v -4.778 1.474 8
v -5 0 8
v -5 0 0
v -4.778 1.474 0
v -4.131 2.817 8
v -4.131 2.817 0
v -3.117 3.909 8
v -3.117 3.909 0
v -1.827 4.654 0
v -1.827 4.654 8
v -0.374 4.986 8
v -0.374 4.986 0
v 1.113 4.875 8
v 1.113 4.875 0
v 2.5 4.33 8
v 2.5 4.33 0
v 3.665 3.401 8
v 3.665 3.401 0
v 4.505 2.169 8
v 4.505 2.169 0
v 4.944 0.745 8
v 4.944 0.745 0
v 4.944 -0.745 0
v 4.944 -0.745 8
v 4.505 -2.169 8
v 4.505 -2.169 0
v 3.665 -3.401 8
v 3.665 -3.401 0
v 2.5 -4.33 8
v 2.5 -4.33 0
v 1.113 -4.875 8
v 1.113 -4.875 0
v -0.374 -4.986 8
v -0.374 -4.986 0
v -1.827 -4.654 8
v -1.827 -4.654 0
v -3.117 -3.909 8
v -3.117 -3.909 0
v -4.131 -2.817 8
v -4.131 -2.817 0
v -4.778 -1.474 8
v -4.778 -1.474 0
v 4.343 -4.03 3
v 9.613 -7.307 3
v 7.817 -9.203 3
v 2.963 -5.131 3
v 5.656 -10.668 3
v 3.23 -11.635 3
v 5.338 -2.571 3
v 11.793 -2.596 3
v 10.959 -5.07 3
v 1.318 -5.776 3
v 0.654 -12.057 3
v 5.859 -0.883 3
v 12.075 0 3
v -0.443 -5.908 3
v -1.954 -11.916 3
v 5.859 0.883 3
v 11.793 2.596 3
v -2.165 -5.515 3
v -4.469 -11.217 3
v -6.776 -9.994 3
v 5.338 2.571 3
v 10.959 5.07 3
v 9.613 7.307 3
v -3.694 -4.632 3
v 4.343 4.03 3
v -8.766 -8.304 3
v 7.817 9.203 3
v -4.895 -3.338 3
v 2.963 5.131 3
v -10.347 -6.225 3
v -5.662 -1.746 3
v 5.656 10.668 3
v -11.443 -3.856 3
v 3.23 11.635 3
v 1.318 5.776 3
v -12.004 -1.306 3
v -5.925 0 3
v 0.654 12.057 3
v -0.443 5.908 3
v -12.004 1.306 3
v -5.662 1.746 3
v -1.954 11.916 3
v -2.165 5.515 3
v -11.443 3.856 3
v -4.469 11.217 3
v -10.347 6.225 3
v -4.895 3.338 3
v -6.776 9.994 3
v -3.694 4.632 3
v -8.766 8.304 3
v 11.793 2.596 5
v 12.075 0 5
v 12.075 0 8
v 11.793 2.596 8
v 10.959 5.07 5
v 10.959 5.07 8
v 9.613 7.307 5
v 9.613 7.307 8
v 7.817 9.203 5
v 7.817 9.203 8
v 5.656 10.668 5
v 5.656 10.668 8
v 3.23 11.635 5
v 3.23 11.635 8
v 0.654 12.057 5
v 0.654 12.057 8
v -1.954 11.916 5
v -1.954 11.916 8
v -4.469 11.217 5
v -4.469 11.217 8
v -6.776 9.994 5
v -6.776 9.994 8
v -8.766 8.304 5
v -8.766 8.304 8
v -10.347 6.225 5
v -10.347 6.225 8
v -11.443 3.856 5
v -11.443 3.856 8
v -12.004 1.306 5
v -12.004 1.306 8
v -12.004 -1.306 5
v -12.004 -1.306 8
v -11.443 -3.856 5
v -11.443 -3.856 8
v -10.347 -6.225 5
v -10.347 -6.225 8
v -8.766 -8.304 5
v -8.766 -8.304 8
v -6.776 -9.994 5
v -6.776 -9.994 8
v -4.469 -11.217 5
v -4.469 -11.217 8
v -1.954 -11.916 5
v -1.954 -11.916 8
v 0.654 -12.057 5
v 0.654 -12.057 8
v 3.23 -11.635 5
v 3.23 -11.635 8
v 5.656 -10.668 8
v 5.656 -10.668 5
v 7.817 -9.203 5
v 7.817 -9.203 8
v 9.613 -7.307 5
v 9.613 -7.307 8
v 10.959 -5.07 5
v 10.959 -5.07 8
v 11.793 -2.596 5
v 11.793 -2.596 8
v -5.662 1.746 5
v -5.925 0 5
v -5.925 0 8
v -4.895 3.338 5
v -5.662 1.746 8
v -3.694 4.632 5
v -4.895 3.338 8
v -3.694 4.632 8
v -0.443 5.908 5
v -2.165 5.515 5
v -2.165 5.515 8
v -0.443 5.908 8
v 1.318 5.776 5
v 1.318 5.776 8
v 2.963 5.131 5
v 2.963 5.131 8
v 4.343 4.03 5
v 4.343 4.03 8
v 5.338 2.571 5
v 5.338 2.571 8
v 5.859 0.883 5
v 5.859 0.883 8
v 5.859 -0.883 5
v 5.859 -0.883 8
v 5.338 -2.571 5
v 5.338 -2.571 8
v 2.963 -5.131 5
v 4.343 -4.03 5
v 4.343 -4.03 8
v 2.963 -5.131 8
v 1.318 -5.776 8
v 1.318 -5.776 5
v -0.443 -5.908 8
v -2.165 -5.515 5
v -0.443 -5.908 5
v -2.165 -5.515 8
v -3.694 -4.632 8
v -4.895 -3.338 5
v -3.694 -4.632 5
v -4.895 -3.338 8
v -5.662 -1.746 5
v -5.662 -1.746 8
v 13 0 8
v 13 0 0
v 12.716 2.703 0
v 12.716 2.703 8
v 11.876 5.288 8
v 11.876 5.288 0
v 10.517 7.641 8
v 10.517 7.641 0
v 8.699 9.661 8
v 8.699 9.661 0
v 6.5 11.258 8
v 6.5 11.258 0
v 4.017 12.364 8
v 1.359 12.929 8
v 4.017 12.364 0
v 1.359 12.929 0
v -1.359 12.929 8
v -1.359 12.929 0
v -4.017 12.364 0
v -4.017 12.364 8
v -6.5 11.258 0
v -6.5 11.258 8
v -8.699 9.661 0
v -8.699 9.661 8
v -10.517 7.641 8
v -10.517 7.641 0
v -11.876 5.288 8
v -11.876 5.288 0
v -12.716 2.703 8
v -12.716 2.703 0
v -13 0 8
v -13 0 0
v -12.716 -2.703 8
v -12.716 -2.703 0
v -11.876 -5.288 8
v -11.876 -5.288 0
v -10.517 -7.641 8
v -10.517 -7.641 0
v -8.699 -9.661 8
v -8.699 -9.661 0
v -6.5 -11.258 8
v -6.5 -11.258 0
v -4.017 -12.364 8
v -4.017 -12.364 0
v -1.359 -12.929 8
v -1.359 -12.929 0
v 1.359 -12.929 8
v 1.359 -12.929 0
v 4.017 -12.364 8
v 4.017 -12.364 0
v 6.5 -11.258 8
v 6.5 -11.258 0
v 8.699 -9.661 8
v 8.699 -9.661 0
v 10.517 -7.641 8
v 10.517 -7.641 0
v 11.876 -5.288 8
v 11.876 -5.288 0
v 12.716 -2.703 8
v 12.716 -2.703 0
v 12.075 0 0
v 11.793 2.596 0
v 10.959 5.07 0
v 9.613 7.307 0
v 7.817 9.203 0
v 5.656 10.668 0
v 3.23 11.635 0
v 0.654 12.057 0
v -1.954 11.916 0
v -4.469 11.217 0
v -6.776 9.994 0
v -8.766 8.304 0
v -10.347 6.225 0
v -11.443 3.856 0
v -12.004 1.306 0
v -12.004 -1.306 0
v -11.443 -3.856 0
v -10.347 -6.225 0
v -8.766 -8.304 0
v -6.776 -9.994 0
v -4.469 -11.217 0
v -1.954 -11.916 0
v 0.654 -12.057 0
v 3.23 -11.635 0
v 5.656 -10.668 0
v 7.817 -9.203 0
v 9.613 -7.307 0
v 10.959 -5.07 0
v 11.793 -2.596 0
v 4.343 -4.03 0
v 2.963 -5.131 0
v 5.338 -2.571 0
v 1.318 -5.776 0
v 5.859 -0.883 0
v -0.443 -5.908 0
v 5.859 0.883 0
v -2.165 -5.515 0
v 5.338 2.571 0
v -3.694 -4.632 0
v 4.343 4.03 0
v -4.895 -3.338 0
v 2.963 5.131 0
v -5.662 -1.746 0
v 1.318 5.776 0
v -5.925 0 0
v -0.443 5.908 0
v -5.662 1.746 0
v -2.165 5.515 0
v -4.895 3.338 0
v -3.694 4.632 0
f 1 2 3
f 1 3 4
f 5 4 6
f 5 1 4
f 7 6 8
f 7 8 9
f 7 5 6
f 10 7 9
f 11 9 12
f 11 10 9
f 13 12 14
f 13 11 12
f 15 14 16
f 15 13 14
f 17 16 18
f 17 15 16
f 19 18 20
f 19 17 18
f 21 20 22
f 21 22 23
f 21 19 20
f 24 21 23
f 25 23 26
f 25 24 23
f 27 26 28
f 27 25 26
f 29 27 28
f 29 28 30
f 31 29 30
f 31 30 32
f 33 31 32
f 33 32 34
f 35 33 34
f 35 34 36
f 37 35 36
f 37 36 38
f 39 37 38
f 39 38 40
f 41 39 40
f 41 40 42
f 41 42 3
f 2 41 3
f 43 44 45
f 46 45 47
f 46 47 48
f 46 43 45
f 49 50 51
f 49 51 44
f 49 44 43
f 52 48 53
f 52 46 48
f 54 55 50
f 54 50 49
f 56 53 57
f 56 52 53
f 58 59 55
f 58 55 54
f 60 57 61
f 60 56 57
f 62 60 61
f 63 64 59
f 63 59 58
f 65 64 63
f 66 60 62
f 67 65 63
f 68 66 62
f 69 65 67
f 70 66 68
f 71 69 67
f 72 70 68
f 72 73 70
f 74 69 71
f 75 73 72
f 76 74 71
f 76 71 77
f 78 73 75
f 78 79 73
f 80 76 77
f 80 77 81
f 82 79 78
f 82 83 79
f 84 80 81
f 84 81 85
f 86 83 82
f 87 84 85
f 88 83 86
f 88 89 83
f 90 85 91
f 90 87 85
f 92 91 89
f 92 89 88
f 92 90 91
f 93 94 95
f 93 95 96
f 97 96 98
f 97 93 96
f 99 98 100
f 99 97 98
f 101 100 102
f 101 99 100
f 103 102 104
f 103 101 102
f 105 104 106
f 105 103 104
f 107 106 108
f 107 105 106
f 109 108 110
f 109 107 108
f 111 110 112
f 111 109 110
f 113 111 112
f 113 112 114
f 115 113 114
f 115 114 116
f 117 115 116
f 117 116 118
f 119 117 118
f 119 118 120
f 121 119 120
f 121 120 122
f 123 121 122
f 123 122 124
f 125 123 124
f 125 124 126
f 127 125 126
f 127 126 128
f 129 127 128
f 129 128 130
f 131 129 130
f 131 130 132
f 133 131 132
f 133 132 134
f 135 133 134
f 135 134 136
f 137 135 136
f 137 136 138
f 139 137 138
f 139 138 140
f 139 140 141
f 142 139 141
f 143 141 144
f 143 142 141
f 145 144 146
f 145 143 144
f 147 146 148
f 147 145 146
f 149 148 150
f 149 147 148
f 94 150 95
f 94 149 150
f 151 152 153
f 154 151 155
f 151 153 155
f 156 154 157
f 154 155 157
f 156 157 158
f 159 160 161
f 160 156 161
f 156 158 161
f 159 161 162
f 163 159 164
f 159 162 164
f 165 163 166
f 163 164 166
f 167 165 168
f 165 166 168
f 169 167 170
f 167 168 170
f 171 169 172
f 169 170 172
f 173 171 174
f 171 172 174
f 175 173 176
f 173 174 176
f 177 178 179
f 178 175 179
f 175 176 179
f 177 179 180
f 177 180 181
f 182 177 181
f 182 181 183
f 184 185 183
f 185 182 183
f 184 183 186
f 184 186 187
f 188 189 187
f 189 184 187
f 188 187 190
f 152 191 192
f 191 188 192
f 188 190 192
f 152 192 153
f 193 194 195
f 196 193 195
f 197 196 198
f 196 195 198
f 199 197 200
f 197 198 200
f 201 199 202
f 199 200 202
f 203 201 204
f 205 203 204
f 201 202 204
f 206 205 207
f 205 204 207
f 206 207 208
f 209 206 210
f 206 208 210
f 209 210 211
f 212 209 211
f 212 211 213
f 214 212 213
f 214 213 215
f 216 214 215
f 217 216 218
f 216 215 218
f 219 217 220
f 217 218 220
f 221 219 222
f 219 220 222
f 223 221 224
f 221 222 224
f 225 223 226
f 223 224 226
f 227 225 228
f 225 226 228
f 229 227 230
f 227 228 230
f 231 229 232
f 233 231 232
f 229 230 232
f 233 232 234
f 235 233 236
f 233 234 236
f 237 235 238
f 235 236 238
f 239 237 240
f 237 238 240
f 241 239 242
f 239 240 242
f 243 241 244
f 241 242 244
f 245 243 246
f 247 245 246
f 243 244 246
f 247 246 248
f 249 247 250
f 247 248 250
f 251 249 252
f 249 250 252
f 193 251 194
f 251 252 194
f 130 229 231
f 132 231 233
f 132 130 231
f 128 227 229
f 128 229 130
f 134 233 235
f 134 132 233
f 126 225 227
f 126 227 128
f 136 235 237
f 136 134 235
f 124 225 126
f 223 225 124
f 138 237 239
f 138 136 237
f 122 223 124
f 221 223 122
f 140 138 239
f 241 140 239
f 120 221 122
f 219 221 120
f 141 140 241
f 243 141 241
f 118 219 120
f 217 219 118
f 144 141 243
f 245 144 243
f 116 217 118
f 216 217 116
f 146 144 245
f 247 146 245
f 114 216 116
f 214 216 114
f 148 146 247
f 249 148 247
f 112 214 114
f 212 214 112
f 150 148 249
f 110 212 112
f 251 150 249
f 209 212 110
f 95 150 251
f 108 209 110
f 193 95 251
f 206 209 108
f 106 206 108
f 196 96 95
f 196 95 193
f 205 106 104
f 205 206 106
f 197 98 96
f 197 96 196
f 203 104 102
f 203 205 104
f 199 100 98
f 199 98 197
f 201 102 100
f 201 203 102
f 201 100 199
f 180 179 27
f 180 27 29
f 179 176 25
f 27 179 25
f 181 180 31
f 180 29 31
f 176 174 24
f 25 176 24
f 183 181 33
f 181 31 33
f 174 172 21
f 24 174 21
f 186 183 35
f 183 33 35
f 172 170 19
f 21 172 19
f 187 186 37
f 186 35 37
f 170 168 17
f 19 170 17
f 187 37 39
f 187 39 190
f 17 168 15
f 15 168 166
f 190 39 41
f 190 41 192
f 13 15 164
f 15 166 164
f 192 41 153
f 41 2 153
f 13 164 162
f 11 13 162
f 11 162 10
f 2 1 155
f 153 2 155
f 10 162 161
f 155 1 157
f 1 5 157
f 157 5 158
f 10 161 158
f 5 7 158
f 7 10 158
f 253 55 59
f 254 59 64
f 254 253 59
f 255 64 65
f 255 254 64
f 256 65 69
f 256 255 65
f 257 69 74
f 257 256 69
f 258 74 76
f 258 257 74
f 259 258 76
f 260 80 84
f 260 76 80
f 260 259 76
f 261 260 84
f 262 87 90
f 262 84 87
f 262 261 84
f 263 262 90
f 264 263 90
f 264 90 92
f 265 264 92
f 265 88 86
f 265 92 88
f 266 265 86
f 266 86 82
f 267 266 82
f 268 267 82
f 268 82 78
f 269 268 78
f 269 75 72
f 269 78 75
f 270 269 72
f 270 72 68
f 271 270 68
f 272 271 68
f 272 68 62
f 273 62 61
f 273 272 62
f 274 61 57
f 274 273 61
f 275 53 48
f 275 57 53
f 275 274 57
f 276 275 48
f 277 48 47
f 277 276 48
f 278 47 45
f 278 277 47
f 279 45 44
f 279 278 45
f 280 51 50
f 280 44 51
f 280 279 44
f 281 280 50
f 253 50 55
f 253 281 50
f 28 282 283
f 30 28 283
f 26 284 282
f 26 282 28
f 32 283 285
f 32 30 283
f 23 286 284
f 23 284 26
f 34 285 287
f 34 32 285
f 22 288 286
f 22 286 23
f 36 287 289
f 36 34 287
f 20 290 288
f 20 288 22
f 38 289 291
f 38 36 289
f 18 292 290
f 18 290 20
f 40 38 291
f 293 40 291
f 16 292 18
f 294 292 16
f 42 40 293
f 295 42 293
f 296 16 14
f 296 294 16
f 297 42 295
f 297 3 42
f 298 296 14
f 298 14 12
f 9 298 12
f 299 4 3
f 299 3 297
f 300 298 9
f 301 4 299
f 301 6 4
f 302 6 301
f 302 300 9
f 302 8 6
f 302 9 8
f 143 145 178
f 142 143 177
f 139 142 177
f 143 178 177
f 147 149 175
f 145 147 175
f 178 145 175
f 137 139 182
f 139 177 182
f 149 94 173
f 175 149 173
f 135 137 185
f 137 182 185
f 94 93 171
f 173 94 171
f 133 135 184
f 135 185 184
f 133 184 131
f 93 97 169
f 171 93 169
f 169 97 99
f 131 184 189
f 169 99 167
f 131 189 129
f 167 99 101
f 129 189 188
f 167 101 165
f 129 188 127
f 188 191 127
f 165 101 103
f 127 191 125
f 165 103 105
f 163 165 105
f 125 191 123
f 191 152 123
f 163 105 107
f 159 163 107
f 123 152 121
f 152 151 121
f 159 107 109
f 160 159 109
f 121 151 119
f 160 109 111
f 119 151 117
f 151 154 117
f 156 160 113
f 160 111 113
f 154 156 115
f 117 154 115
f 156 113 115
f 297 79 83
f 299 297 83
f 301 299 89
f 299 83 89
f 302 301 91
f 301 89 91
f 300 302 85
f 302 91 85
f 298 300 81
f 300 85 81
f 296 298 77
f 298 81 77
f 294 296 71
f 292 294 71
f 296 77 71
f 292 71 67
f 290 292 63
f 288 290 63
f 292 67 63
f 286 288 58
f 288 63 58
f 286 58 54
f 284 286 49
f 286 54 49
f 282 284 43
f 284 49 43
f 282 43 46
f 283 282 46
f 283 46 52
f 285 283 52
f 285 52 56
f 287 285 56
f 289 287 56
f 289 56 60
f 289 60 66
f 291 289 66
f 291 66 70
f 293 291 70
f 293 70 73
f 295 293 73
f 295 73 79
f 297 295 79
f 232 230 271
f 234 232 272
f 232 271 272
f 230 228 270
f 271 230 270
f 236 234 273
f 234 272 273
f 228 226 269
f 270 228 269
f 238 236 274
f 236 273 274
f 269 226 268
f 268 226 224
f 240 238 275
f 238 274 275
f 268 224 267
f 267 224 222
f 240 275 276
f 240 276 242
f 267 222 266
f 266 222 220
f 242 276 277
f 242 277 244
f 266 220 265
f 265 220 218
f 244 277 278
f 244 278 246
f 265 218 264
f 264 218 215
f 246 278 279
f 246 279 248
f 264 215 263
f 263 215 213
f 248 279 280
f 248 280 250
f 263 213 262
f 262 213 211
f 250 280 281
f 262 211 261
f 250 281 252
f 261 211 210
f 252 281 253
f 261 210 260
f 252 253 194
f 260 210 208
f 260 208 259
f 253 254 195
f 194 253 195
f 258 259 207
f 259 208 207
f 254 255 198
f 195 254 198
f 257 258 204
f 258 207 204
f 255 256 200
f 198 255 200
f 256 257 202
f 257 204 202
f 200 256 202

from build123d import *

# Parameters (mm, degrees)
SKETCH2_R                = 13
SKETCH2_R_2              = 12.075
BOSS_EXTRUDE1_DEPTH      = 8
BOSS_EXTRUDE2_DEPTH      = 1
BOSS_EXTRUDE2_DEPTH_BACK = 1
SKETCH3_R                = 12.569499656
BOSS_EXTRUDE3_DEPTH      = 4
BOSS_EXTRUDE3_DEPTH_BACK = 4
SKETCH5_R                = 5.925
SKETCH5_R_2              = 5
SKETCH6_R                = 5
CUT_EXTRUDE1_DEPTH       = 2


with BuildPart() as part:
    # Sketch2 → Boss-Extrude1 (new body)
    with BuildSketch(Plane.XY):
        Circle(SKETCH2_R)
        Circle(SKETCH2_R_2, mode=Mode.SUBTRACT)
    extrude(amount=BOSS_EXTRUDE1_DEPTH)

    # Sketch3 → Boss-Extrude2 (add, two sides: drawn at the far end of the back side and taken through both)
    with BuildSketch(Plane(origin=(0, 0, 4), x_dir=(-1, 0, 0), z_dir=(0, 0, -1)).offset(-BOSS_EXTRUDE2_DEPTH_BACK)):
        Circle(SKETCH3_R)
    extrude(amount=BOSS_EXTRUDE2_DEPTH + BOSS_EXTRUDE2_DEPTH_BACK)

    # Sketch5 → Boss-Extrude3 (add, two sides: drawn at the far end of the back side and taken through both)
    with BuildSketch(Plane(origin=(0, 0, 4), x_dir=(-1, 0, 0), z_dir=(0, 0, -1)).offset(-BOSS_EXTRUDE3_DEPTH_BACK)):
        Circle(SKETCH5_R)
        Circle(SKETCH5_R_2, mode=Mode.SUBTRACT)
    extrude(amount=BOSS_EXTRUDE3_DEPTH + BOSS_EXTRUDE3_DEPTH_BACK)

    # Sketch6 → Cut-Extrude1 (cut)
    with BuildSketch(Plane.XY.offset(5)):
        with Locations(Location((0, 0, 0), (0, 0, 180))):
            Circle(SKETCH6_R)
    extrude(amount=-CUT_EXTRUDE1_DEPTH, mode=Mode.SUBTRACT)


solid = part.part
